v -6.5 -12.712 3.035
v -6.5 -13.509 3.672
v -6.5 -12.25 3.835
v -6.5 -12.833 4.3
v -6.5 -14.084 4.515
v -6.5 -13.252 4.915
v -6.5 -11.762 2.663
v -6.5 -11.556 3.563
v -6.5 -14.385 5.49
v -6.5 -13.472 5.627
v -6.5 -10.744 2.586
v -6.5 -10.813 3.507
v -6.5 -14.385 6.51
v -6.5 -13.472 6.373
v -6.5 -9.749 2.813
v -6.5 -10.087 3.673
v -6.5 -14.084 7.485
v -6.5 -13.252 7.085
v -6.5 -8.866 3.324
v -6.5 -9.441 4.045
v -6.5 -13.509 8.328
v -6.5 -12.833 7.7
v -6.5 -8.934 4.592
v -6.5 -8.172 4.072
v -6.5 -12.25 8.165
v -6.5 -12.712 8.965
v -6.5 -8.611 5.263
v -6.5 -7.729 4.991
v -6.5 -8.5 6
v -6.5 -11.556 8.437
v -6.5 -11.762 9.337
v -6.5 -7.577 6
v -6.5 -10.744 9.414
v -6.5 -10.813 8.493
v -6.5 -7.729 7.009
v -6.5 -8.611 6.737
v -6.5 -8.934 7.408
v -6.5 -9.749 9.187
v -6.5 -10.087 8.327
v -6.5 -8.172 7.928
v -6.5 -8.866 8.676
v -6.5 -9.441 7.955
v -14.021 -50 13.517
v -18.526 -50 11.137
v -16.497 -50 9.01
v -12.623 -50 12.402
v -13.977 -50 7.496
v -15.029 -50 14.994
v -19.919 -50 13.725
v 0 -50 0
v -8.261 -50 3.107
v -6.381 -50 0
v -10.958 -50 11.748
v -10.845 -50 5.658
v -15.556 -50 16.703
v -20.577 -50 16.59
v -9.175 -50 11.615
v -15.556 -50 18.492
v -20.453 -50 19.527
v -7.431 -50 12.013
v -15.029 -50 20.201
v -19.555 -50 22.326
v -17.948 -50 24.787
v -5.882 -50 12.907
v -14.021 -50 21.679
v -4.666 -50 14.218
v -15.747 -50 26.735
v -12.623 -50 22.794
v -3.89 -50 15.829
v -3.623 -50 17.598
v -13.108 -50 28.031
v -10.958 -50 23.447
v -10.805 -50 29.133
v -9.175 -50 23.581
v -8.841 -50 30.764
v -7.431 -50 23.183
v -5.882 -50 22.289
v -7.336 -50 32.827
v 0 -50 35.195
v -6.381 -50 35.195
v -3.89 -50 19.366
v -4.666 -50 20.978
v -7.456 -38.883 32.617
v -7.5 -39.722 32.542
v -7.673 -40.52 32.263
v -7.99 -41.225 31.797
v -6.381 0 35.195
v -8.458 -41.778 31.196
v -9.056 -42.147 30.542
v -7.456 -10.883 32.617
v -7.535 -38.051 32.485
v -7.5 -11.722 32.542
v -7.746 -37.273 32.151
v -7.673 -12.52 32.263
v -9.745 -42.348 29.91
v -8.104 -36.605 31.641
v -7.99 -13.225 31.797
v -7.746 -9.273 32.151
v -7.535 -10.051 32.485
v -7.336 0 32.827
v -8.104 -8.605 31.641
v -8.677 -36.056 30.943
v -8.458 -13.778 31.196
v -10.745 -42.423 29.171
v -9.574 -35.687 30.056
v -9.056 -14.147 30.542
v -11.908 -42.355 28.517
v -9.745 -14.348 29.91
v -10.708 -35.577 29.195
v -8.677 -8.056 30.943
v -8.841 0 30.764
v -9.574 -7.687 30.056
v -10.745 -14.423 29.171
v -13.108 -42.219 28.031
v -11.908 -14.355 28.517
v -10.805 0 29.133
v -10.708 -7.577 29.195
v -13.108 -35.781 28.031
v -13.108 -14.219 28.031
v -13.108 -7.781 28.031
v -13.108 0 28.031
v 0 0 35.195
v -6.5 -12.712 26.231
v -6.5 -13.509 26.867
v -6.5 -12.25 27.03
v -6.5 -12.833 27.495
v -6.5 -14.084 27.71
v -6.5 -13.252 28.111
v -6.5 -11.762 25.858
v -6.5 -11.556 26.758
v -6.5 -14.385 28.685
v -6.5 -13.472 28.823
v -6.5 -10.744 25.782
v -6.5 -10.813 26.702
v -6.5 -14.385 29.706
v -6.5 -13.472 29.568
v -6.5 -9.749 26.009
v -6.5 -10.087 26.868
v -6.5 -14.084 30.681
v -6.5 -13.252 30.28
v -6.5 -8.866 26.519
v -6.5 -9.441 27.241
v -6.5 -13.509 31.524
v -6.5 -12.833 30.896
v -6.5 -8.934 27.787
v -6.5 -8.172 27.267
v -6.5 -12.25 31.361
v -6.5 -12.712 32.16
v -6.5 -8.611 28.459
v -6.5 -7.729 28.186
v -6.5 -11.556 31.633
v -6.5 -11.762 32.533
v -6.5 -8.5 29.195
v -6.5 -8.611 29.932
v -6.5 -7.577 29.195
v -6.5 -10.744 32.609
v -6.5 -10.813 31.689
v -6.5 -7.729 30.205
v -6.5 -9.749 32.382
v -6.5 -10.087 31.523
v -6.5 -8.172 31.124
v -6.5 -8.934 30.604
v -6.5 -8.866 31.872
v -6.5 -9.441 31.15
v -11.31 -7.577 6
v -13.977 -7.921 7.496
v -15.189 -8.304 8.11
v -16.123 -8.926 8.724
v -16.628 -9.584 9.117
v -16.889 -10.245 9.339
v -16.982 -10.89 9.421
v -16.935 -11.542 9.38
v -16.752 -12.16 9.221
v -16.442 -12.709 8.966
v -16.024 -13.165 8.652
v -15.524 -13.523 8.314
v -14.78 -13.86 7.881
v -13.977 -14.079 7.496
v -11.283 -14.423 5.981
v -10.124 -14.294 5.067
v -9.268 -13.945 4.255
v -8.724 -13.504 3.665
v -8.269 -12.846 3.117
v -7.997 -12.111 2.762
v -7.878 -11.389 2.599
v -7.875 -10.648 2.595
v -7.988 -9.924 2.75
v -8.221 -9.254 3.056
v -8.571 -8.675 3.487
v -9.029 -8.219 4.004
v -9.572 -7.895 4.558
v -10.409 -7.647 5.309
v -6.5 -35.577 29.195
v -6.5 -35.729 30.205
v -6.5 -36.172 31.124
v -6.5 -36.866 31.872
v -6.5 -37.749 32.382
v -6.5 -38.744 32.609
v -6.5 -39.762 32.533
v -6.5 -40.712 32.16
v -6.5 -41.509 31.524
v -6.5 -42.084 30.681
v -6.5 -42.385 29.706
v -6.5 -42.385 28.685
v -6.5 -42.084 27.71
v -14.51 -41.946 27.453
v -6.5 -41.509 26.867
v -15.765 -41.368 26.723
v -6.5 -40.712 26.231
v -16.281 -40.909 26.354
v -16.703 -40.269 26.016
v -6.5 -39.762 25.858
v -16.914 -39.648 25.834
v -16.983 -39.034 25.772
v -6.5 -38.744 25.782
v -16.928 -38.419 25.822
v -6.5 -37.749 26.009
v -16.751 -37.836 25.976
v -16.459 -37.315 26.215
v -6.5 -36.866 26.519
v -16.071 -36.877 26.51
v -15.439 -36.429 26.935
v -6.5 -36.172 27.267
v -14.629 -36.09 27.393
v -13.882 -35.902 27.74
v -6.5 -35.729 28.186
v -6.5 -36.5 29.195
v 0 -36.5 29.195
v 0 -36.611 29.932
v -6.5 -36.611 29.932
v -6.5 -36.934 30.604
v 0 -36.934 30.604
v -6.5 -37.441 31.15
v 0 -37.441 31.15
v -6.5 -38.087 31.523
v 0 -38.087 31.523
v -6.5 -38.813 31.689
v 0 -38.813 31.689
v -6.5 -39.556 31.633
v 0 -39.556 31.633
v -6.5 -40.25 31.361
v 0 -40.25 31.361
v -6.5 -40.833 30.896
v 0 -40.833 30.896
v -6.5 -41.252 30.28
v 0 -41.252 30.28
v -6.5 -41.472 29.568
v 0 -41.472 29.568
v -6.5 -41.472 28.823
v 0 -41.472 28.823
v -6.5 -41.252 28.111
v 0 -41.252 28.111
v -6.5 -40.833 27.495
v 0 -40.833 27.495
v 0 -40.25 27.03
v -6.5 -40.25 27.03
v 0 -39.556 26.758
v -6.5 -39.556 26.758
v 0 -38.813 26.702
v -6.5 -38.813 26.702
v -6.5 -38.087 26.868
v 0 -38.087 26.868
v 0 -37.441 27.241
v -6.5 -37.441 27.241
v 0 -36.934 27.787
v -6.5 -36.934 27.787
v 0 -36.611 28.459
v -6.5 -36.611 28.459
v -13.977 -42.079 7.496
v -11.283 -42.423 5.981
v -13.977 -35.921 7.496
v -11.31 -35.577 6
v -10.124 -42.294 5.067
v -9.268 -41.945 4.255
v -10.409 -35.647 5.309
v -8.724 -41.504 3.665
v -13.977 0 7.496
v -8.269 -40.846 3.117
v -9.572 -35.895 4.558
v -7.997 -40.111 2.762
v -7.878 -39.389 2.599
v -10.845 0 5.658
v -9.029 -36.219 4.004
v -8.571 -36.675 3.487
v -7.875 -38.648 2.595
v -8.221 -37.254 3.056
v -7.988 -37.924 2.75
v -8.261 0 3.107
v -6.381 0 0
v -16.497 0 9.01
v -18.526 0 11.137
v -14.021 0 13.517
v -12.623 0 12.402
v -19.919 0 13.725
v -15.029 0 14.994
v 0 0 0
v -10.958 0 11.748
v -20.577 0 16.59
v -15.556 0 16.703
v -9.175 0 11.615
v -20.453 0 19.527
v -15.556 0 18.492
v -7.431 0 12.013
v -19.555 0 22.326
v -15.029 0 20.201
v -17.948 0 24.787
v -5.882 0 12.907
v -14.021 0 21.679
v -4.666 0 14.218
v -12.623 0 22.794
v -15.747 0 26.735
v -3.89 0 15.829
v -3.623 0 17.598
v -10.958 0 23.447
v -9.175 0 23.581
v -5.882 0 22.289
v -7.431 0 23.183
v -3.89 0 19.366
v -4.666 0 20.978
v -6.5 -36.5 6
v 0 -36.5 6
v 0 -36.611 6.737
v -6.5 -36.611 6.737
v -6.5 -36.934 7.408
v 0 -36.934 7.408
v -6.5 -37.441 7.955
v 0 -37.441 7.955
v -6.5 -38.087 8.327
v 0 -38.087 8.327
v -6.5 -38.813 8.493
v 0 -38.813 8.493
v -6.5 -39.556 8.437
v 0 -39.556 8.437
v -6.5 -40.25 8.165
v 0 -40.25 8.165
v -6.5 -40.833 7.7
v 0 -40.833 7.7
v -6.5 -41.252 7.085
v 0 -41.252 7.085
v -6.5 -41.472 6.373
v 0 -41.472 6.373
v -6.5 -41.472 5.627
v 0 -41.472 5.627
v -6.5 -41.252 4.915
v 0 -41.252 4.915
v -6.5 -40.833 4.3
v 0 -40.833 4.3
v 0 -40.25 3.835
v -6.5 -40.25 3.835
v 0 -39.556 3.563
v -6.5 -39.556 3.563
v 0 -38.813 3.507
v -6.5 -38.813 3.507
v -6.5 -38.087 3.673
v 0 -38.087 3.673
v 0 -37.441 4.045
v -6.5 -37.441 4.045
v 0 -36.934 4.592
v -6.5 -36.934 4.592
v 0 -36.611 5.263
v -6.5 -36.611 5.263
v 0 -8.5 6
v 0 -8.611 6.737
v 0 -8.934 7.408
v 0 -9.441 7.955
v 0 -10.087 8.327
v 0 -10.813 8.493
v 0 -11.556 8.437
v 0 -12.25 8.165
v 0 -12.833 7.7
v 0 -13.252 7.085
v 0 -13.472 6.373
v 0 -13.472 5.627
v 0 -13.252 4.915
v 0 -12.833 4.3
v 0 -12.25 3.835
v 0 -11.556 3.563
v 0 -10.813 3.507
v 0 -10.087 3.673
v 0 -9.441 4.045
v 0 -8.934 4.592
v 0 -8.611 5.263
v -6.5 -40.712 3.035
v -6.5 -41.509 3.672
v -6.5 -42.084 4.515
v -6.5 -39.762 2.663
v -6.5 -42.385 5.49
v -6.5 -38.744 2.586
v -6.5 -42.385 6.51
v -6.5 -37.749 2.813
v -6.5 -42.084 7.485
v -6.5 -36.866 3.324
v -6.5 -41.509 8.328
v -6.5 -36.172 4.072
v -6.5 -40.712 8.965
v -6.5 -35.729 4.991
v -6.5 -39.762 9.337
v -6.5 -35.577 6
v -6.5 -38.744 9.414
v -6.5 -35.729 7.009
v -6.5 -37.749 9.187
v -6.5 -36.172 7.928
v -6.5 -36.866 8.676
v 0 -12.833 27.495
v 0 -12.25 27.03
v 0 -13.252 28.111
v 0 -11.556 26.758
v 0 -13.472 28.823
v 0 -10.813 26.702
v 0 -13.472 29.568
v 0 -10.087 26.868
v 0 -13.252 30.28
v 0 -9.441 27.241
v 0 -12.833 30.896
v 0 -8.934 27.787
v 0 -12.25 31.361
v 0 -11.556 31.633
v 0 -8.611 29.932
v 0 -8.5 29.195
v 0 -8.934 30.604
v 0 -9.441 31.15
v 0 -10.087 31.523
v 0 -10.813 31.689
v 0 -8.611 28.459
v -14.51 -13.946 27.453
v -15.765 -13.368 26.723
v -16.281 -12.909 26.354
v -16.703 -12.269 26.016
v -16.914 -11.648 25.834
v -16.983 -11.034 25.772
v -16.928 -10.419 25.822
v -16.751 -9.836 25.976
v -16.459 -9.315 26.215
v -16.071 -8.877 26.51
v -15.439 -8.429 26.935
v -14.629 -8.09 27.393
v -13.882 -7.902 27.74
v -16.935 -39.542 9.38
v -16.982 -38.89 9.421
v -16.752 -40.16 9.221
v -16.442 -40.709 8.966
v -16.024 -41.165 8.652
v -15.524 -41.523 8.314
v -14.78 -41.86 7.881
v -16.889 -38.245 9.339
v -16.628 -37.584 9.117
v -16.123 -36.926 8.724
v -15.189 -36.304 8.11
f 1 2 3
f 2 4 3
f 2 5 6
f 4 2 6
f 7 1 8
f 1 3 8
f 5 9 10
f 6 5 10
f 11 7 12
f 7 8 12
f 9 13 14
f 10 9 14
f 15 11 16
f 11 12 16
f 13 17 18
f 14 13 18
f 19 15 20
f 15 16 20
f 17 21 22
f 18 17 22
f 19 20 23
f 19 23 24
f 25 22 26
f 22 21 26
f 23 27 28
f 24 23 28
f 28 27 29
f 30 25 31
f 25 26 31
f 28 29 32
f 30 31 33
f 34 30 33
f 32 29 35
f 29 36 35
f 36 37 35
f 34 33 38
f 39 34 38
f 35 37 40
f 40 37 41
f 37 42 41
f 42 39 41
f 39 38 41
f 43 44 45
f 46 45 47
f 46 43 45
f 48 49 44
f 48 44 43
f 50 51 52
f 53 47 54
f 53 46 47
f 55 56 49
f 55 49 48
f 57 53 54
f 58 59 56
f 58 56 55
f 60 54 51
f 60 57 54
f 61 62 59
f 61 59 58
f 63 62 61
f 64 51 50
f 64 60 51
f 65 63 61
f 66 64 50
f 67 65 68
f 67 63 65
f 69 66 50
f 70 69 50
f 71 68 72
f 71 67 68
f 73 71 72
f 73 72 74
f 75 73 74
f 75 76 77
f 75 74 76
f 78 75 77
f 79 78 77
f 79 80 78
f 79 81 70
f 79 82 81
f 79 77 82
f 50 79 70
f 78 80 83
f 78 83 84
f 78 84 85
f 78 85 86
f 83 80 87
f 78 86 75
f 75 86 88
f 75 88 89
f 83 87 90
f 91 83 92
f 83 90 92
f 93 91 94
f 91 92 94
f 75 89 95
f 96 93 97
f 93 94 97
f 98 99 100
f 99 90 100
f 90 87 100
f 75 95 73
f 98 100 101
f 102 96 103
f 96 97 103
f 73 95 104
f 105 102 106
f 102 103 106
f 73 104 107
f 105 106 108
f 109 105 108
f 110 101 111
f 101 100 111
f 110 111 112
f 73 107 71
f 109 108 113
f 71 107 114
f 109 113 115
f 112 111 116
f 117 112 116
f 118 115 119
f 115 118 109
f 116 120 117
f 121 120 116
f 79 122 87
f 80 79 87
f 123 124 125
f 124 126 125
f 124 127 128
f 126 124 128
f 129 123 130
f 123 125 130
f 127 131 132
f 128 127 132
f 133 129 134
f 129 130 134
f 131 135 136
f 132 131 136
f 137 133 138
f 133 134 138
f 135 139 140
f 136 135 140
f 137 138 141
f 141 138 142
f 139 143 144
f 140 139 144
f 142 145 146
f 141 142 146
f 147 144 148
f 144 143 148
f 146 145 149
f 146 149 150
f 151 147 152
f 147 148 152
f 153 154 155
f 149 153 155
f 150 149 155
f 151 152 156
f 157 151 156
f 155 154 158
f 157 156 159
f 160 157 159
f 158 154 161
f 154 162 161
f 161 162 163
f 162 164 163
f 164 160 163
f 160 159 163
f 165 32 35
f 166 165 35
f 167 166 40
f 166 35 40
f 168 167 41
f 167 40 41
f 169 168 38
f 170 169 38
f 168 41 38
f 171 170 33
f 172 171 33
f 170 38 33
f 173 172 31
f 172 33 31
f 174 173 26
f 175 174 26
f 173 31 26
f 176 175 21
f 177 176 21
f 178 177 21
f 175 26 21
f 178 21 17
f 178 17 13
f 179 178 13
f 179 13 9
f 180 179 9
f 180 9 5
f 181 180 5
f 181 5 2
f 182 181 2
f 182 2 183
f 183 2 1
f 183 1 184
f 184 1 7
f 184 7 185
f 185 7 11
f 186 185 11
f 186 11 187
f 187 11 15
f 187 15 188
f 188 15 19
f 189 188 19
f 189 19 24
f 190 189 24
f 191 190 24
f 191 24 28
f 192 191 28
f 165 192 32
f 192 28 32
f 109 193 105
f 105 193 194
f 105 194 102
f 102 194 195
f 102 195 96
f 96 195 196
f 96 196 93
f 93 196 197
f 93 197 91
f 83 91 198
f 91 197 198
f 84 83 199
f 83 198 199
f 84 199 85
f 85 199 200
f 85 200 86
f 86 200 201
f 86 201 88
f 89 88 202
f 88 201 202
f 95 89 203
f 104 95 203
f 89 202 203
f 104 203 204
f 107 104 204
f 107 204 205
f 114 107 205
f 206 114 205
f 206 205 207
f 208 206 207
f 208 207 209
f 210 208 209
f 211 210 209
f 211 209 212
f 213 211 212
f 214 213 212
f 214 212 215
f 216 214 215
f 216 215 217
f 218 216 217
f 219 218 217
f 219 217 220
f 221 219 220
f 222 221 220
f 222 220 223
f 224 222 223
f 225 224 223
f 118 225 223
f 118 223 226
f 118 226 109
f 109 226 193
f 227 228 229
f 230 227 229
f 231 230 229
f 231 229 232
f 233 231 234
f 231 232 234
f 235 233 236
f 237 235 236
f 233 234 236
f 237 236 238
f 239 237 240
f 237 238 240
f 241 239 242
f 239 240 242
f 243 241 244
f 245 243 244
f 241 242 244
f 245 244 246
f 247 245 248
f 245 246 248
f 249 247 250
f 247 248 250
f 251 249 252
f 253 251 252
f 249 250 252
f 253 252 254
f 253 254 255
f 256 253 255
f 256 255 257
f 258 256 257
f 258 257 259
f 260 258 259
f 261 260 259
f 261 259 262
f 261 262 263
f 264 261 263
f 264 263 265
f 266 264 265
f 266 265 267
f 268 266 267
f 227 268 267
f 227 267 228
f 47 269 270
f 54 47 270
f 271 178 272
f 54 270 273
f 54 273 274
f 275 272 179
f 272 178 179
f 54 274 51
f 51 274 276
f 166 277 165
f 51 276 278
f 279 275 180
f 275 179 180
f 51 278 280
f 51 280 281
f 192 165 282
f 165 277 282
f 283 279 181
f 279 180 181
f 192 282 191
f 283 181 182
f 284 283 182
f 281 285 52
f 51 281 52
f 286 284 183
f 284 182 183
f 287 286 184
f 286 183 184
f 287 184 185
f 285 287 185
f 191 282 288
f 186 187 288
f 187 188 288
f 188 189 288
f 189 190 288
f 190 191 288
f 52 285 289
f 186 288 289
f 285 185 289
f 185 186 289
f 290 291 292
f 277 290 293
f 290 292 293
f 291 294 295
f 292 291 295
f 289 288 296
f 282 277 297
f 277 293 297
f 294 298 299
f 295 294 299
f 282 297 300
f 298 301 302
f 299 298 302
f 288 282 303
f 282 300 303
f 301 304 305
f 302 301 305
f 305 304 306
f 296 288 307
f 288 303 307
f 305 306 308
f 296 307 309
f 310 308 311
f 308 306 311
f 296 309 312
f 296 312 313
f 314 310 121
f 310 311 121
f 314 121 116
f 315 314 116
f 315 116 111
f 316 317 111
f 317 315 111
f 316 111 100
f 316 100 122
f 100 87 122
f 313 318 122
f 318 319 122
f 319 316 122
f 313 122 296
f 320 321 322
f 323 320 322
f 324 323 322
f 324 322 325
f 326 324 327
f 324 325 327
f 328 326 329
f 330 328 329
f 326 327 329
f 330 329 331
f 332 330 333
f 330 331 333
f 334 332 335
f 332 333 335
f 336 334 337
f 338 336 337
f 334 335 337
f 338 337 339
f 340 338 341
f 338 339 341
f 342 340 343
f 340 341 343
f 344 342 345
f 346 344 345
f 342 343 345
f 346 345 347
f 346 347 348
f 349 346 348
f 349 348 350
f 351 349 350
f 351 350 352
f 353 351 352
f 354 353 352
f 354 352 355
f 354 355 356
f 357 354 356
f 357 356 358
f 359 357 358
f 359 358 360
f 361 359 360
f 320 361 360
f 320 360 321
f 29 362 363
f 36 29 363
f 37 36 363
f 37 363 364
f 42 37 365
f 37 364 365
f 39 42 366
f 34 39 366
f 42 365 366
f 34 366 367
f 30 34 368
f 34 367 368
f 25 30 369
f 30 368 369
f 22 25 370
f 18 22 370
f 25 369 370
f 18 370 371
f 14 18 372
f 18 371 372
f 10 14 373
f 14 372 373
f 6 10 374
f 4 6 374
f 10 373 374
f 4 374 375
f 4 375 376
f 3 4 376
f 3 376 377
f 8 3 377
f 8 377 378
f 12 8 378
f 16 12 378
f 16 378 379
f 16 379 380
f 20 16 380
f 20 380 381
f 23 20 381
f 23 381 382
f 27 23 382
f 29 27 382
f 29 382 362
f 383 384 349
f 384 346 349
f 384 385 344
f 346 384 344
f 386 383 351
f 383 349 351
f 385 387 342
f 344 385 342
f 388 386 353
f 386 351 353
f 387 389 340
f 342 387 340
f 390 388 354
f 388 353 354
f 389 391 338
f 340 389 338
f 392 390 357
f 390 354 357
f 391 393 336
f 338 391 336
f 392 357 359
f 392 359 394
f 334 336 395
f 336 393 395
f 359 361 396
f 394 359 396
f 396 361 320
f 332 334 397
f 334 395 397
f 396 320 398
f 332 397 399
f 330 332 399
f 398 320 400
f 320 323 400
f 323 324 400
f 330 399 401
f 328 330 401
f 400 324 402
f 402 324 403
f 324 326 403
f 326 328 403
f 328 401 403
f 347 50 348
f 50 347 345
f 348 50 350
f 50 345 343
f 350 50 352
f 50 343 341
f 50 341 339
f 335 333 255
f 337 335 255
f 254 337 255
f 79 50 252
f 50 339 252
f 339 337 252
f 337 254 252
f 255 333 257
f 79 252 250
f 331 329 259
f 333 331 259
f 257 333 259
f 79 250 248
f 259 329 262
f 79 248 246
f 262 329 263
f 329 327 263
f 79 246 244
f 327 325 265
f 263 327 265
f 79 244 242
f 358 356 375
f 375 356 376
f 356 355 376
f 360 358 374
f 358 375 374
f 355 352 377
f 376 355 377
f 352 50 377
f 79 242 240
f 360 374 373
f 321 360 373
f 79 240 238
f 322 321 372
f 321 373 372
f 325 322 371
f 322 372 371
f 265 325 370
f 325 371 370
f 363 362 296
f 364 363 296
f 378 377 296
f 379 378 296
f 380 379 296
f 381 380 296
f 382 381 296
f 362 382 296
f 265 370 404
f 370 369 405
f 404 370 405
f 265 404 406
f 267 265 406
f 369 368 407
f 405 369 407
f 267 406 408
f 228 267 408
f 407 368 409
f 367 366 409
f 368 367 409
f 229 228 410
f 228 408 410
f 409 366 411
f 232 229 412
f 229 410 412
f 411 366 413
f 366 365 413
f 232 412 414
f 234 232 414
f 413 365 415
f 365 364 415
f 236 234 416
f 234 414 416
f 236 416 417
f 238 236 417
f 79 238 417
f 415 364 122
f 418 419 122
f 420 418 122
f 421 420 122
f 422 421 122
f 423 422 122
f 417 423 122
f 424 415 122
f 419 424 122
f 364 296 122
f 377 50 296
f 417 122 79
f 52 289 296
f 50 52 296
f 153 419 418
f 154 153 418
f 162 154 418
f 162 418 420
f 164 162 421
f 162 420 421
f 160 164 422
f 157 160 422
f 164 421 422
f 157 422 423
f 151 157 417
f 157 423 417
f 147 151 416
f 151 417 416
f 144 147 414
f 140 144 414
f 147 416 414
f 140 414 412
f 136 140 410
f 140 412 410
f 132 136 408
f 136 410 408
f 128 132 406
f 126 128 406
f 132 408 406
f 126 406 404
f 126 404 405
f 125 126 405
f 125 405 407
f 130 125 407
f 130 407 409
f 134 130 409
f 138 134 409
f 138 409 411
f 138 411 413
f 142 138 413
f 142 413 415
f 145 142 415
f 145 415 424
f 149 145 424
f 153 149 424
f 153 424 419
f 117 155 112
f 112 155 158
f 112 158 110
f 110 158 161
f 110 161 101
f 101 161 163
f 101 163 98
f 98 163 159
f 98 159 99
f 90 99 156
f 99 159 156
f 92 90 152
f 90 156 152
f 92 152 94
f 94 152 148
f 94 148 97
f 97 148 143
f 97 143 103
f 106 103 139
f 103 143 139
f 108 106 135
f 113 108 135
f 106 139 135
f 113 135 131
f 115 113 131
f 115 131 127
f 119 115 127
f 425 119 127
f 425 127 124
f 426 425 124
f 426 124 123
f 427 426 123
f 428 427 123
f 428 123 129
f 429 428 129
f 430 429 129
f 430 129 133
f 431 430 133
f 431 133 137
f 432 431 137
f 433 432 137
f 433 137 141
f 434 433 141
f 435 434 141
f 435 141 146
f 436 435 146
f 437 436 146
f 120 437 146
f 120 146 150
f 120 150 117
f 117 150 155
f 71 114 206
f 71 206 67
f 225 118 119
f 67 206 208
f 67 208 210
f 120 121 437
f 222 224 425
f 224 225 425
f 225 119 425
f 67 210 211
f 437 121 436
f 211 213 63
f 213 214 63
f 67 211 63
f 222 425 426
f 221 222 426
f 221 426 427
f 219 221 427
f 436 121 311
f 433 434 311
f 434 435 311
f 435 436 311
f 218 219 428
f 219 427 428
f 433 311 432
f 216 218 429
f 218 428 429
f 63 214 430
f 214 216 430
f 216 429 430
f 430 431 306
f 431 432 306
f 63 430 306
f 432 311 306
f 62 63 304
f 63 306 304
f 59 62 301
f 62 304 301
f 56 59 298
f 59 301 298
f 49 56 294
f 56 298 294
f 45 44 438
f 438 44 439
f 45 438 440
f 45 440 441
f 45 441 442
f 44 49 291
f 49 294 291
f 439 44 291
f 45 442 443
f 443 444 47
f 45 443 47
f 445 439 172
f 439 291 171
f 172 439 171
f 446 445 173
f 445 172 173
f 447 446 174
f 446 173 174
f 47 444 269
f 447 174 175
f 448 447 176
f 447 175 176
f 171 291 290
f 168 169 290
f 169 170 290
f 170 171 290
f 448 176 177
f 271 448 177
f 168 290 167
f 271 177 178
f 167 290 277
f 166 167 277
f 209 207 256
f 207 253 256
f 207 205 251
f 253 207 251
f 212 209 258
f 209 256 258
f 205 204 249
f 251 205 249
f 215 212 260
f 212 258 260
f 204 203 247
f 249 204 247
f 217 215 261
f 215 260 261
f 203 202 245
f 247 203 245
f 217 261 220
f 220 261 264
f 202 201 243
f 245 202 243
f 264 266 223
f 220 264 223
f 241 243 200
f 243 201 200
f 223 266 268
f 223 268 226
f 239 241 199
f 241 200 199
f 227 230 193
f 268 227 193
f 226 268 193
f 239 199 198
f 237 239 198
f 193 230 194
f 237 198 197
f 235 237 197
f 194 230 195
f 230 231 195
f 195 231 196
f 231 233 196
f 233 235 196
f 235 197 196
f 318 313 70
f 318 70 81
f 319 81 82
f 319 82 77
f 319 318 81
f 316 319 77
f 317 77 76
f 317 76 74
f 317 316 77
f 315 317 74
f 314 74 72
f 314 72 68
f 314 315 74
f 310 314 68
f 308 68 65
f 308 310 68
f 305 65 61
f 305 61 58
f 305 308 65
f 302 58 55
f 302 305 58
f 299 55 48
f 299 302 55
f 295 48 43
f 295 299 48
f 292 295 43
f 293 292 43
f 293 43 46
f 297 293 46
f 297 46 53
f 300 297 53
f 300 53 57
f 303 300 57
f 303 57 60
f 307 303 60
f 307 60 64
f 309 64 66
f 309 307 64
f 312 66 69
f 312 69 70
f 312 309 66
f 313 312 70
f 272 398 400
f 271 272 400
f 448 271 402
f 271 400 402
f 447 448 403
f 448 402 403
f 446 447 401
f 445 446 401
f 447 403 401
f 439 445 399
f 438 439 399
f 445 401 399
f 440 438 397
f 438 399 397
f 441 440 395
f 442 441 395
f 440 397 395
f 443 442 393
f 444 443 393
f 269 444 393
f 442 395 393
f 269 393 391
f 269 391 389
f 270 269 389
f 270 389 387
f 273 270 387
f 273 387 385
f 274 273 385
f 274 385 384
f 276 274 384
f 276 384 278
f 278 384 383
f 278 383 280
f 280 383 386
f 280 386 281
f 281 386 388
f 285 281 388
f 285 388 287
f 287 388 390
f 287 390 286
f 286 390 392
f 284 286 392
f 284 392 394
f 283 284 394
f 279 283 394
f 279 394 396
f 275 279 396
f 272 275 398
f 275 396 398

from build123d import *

# Parameters (mm, degrees)
F0_R     = 6
F1_DEPTH = 50
F2_R     = 2.5
F3_DEPTH = 25
F5_R     = 3.423218
F6_DEPTH = 25


with BuildPart() as f1:
    # F0 (on Front) → F1 (new body)
    with BuildSketch(Plane.XZ):
        with BuildLine():
            Line((0, 0), (0, 35.195496))
            Line((0, 35.195496), (-6.381311, 35.195496))
            ThreePointArc((-6.381311, 35.195496), (-8.840759, 30.764286), (-13.108497, 28.030987))
            ThreePointArc((-13.108497, 28.030987), (-20.613351, 18.062411), (-13.976716, 7.495935))
            ThreePointArc((-13.976716, 7.495935), (-9.473946, 4.46239), (-6.381311, 0))
            Line((-6.381311, 0), (0, 0))
        make_face()
        with Locations((-9.623169, 17.597748)):
            Circle(F0_R, mode=Mode.SUBTRACT)
    extrude(amount=F1_DEPTH)

    # F2 (on face) → F3 (cut)
    with BuildSketch(Plane.YZ):
        with Locations((-39, 29.195496)):
            Circle(F2_R)
        with Locations((-11, 29.195496)):
            Circle(F2_R)
        with Locations((-39, 6)):
            Circle(F2_R)
        with Locations((-11, 6)):
            Circle(F2_R)
    extrude(amount=-F3_DEPTH, mode=Mode.SUBTRACT)

    # F5 (on offset) → F6 (cut)
    with BuildSketch(Plane.YZ.offset(-6.5)):
        with Locations((-11, 6)):
            Circle(F5_R)
        with Locations((-39, 6)):
            Circle(F5_R)
        with Locations((-11, 29.195496)):
            Circle(F5_R)
        with Locations((-39, 29.195496)):
            Circle(F5_R)
    extrude(amount=-F6_DEPTH, mode=Mode.SUBTRACT)


solid = f1.part
